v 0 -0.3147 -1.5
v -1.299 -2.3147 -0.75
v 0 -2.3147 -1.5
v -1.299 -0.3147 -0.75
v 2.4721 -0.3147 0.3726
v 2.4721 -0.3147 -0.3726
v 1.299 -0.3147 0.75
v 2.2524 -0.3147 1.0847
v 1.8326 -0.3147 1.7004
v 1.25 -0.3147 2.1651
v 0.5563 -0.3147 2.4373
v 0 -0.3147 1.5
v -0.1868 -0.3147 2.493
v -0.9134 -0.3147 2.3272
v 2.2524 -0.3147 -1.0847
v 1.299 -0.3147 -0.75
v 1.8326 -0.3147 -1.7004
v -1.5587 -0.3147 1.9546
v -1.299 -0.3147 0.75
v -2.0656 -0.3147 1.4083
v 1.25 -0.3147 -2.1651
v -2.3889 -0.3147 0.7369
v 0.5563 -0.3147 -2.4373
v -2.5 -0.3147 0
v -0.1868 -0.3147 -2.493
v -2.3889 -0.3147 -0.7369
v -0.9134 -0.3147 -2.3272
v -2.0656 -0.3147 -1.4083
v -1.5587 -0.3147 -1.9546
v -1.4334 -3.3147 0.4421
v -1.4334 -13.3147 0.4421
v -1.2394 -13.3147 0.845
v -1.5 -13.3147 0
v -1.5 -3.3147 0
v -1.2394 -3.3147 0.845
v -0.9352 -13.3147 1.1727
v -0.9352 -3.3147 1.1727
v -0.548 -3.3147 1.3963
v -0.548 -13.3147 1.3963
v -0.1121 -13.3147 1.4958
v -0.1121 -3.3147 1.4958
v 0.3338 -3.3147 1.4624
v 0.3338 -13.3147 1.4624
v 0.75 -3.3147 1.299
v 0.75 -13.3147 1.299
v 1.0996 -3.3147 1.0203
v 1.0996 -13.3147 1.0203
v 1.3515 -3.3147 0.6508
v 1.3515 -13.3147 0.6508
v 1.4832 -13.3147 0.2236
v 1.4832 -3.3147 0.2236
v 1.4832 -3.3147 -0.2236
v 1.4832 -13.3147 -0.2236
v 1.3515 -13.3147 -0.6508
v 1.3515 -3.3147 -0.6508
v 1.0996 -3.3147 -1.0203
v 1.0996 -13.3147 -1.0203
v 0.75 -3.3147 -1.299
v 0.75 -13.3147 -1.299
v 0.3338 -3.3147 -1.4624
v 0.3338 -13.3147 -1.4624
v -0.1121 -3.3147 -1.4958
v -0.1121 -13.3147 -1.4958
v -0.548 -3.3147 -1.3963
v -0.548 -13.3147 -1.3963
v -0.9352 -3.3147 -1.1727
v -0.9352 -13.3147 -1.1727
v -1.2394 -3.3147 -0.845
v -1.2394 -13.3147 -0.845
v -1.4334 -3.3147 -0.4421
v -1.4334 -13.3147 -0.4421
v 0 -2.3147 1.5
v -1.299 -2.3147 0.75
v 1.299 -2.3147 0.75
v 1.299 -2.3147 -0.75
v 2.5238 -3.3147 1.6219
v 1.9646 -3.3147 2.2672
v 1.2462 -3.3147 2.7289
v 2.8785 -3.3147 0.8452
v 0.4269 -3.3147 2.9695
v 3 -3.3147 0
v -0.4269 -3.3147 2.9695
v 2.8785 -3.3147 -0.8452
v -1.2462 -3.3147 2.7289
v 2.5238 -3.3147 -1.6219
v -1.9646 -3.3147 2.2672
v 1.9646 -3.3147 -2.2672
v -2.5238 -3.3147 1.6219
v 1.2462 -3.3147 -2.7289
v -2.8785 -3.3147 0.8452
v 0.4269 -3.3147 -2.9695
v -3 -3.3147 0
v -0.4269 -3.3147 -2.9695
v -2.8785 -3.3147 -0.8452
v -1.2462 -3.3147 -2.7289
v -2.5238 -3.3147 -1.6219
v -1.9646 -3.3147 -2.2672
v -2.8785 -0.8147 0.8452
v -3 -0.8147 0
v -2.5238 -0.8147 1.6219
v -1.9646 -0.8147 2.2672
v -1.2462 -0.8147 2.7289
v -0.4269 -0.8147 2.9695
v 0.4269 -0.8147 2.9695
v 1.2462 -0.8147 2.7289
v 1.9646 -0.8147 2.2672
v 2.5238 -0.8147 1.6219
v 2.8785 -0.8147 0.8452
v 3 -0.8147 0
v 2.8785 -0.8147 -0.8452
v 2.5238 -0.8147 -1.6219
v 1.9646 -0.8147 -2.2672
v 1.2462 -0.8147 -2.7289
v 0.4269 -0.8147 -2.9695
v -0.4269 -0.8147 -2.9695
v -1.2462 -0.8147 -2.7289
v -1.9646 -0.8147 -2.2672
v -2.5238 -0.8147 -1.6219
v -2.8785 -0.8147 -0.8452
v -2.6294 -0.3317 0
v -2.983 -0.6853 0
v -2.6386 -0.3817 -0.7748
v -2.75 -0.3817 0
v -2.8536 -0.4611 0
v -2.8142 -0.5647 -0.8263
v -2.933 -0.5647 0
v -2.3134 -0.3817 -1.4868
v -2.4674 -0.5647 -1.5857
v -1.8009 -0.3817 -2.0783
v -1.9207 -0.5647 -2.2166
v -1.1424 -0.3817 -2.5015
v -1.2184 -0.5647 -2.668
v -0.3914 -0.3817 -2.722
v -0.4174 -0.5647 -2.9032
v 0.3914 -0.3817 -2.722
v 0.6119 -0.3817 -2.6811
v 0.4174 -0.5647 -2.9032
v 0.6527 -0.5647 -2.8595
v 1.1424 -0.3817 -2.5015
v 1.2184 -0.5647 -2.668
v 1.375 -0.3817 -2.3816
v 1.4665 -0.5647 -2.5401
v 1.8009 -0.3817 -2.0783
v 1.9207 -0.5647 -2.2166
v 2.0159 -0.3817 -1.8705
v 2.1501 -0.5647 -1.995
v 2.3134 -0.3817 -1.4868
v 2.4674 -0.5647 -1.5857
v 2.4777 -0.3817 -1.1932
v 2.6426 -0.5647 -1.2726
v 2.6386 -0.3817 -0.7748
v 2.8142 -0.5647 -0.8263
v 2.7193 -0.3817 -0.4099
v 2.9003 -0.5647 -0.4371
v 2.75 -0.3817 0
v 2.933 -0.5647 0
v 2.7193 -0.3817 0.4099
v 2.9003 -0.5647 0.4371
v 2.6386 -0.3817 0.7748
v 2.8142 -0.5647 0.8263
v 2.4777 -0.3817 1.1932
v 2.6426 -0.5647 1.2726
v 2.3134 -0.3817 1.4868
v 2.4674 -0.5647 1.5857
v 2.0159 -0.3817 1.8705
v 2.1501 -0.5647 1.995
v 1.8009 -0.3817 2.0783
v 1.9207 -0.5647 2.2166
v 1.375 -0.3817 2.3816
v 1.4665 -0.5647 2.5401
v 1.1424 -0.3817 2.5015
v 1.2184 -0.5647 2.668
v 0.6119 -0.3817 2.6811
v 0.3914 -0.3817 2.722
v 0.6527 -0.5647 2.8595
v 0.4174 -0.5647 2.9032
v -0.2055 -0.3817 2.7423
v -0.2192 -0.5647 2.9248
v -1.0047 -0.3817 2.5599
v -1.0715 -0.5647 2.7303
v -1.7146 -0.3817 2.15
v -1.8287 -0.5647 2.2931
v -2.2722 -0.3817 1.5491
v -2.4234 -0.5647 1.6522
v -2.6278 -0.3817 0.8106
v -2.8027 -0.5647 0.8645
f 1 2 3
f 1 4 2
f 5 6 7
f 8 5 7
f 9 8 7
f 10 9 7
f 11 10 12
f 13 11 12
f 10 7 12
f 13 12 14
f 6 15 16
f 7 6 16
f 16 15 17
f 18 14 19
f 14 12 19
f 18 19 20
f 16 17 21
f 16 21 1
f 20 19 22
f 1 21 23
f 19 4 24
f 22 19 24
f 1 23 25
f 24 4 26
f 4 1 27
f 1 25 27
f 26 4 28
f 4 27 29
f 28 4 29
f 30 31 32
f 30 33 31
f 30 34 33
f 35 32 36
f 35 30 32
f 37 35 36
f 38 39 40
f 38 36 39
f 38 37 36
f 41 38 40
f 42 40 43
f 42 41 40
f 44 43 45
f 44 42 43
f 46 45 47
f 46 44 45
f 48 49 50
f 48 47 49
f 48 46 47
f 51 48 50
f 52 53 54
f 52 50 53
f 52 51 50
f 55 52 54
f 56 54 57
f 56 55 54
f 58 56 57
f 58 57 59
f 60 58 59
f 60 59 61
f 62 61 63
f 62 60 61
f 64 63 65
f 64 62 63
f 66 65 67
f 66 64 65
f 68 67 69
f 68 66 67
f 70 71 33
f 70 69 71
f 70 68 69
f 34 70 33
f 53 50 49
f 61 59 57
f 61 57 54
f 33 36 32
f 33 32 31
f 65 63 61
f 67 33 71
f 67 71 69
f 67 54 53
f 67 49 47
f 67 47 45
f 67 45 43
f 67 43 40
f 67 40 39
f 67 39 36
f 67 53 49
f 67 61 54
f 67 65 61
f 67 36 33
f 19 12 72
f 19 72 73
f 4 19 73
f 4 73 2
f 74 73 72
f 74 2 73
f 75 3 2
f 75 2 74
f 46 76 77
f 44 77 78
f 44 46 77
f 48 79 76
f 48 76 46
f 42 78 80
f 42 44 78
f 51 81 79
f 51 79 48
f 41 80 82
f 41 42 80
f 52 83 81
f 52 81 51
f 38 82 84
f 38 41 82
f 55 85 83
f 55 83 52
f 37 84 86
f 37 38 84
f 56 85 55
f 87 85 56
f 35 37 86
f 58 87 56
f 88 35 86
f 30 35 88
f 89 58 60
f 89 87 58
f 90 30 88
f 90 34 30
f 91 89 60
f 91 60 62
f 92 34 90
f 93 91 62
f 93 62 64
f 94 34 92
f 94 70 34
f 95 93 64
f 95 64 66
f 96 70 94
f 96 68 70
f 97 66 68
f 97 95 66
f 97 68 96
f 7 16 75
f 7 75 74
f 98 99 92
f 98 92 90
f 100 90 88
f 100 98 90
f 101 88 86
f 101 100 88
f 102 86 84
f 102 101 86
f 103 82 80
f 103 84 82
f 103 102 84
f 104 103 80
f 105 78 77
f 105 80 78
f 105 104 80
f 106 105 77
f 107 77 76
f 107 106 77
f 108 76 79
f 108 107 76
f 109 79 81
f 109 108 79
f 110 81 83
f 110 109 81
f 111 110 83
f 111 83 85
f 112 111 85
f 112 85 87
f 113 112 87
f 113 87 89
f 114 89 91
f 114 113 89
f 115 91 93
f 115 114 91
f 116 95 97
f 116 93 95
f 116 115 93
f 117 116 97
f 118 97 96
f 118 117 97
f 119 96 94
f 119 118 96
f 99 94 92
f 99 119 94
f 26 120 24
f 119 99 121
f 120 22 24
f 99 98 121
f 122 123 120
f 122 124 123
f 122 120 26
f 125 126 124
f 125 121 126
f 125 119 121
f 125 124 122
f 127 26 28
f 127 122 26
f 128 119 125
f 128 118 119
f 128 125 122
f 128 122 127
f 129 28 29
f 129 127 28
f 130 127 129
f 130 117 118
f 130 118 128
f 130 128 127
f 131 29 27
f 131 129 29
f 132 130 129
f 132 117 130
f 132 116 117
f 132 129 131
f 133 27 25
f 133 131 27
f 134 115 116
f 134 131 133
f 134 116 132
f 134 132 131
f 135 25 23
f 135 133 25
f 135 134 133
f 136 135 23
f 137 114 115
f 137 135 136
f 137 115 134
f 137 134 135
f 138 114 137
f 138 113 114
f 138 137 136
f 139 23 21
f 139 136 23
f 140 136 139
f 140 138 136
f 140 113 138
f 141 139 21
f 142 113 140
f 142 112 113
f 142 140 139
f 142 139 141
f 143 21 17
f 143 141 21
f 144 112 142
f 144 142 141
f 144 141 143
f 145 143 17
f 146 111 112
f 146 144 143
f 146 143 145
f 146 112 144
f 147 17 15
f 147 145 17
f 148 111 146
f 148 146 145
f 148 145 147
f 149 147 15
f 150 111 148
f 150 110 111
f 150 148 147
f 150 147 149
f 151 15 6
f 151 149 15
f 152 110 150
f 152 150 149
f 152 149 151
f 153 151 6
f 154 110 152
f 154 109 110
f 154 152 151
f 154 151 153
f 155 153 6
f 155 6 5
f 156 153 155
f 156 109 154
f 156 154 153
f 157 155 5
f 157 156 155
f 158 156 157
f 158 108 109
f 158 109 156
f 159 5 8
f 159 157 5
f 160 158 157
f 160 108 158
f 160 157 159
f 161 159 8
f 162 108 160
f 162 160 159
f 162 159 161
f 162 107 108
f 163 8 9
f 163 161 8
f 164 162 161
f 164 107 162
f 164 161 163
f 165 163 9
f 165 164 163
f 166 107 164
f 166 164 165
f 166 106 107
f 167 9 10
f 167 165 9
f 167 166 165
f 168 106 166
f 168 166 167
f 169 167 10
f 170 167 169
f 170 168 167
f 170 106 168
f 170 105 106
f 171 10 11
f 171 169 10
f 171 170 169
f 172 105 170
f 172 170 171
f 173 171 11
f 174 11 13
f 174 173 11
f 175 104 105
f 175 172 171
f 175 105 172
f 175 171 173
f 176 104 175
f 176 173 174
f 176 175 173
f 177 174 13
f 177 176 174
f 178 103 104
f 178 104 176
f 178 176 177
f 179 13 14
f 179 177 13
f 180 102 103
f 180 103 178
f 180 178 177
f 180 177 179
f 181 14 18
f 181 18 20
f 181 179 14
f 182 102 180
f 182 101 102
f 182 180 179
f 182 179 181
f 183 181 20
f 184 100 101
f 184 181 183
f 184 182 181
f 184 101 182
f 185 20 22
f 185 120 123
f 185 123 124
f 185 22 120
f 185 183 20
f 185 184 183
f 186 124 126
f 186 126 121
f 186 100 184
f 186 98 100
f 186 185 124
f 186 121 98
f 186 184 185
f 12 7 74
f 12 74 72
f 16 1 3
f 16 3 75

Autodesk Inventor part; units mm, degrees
ref_plane "YZ Plane" through (0, 0, 0) normal (1, 0, 0) x (0, 1, 0)
ref_plane "XZ Plane" through (0, 0, 0) normal (0, 1, 0) x (-1, 0, 0)
ref_plane "XY Plane" through (0, 0, 0) normal (0, 0, 1) x (1, 0, 0)
sketch "スケッチ1" plane through (0, 0, 0) normal (0, 0, 1) x (1, 0, 0)
  line L0 (-3, -0.3147) -> (0, -0.3147)
  line L1 (0, -0.3147) -> (0, -3.3147)
  line L2 (0, -3.3147) -> (-3, -3.3147)
  line L3 (-3, -3.3147) -> (-3, -0.3147)
  line L4 (-1.5, -3.3147) -> (0, -3.3147)
  line L5 (0, -3.3147) -> (0, -13.3147)
  line L6 (0, -13.3147) -> (-1.5, -13.3147)
  line L7 (-1.5, -13.3147) -> (-1.5, -3.3147)
  point P0 (0, 0)
  dimension "d0" = 1.5
  dimension "d1" = 0
  dimension "d2" = 10
  dimension "d3" = 0
  dimension "d4" = 3
revolve "回転1" add sketch "スケッチ1" angle 360 about axis through (0, -3.3147, 0) along (0, -1, 0)
thread "ねじ1" size "M3x0.5" class "6g" standard "ANSI Metric M Profile" full length
sketch "スケッチ2" plane through (0, -0.3147, 0) normal (0, 1, 0) x (1, 0, 0)
  circle A0 centre (0, 0) radius 3 projected
  line L0 (0, 1.5) -> (1.299, 0.75)
  line L1 (1.299, 0.75) -> (1.299, -0.75)
  line L2 (1.299, -0.75) -> (0, -1.5)
  line L3 (0, -1.5) -> (-1.299, -0.75)
  line L4 (-1.299, -0.75) -> (-1.299, 0.75)
  line L5 (-1.299, 0.75) -> (0, 1.5)
  dimension "d8" = 1.5
extrude "押し出し1" cut sketch "スケッチ2" against normal blind 2 contours L0 L1 L2 L3 L4 L5
fillet "フィレット1" radius 0.5 1 edges at (3, -0.3147, 0)
properties part number "M3_10" material "アルミニウム 6061"
